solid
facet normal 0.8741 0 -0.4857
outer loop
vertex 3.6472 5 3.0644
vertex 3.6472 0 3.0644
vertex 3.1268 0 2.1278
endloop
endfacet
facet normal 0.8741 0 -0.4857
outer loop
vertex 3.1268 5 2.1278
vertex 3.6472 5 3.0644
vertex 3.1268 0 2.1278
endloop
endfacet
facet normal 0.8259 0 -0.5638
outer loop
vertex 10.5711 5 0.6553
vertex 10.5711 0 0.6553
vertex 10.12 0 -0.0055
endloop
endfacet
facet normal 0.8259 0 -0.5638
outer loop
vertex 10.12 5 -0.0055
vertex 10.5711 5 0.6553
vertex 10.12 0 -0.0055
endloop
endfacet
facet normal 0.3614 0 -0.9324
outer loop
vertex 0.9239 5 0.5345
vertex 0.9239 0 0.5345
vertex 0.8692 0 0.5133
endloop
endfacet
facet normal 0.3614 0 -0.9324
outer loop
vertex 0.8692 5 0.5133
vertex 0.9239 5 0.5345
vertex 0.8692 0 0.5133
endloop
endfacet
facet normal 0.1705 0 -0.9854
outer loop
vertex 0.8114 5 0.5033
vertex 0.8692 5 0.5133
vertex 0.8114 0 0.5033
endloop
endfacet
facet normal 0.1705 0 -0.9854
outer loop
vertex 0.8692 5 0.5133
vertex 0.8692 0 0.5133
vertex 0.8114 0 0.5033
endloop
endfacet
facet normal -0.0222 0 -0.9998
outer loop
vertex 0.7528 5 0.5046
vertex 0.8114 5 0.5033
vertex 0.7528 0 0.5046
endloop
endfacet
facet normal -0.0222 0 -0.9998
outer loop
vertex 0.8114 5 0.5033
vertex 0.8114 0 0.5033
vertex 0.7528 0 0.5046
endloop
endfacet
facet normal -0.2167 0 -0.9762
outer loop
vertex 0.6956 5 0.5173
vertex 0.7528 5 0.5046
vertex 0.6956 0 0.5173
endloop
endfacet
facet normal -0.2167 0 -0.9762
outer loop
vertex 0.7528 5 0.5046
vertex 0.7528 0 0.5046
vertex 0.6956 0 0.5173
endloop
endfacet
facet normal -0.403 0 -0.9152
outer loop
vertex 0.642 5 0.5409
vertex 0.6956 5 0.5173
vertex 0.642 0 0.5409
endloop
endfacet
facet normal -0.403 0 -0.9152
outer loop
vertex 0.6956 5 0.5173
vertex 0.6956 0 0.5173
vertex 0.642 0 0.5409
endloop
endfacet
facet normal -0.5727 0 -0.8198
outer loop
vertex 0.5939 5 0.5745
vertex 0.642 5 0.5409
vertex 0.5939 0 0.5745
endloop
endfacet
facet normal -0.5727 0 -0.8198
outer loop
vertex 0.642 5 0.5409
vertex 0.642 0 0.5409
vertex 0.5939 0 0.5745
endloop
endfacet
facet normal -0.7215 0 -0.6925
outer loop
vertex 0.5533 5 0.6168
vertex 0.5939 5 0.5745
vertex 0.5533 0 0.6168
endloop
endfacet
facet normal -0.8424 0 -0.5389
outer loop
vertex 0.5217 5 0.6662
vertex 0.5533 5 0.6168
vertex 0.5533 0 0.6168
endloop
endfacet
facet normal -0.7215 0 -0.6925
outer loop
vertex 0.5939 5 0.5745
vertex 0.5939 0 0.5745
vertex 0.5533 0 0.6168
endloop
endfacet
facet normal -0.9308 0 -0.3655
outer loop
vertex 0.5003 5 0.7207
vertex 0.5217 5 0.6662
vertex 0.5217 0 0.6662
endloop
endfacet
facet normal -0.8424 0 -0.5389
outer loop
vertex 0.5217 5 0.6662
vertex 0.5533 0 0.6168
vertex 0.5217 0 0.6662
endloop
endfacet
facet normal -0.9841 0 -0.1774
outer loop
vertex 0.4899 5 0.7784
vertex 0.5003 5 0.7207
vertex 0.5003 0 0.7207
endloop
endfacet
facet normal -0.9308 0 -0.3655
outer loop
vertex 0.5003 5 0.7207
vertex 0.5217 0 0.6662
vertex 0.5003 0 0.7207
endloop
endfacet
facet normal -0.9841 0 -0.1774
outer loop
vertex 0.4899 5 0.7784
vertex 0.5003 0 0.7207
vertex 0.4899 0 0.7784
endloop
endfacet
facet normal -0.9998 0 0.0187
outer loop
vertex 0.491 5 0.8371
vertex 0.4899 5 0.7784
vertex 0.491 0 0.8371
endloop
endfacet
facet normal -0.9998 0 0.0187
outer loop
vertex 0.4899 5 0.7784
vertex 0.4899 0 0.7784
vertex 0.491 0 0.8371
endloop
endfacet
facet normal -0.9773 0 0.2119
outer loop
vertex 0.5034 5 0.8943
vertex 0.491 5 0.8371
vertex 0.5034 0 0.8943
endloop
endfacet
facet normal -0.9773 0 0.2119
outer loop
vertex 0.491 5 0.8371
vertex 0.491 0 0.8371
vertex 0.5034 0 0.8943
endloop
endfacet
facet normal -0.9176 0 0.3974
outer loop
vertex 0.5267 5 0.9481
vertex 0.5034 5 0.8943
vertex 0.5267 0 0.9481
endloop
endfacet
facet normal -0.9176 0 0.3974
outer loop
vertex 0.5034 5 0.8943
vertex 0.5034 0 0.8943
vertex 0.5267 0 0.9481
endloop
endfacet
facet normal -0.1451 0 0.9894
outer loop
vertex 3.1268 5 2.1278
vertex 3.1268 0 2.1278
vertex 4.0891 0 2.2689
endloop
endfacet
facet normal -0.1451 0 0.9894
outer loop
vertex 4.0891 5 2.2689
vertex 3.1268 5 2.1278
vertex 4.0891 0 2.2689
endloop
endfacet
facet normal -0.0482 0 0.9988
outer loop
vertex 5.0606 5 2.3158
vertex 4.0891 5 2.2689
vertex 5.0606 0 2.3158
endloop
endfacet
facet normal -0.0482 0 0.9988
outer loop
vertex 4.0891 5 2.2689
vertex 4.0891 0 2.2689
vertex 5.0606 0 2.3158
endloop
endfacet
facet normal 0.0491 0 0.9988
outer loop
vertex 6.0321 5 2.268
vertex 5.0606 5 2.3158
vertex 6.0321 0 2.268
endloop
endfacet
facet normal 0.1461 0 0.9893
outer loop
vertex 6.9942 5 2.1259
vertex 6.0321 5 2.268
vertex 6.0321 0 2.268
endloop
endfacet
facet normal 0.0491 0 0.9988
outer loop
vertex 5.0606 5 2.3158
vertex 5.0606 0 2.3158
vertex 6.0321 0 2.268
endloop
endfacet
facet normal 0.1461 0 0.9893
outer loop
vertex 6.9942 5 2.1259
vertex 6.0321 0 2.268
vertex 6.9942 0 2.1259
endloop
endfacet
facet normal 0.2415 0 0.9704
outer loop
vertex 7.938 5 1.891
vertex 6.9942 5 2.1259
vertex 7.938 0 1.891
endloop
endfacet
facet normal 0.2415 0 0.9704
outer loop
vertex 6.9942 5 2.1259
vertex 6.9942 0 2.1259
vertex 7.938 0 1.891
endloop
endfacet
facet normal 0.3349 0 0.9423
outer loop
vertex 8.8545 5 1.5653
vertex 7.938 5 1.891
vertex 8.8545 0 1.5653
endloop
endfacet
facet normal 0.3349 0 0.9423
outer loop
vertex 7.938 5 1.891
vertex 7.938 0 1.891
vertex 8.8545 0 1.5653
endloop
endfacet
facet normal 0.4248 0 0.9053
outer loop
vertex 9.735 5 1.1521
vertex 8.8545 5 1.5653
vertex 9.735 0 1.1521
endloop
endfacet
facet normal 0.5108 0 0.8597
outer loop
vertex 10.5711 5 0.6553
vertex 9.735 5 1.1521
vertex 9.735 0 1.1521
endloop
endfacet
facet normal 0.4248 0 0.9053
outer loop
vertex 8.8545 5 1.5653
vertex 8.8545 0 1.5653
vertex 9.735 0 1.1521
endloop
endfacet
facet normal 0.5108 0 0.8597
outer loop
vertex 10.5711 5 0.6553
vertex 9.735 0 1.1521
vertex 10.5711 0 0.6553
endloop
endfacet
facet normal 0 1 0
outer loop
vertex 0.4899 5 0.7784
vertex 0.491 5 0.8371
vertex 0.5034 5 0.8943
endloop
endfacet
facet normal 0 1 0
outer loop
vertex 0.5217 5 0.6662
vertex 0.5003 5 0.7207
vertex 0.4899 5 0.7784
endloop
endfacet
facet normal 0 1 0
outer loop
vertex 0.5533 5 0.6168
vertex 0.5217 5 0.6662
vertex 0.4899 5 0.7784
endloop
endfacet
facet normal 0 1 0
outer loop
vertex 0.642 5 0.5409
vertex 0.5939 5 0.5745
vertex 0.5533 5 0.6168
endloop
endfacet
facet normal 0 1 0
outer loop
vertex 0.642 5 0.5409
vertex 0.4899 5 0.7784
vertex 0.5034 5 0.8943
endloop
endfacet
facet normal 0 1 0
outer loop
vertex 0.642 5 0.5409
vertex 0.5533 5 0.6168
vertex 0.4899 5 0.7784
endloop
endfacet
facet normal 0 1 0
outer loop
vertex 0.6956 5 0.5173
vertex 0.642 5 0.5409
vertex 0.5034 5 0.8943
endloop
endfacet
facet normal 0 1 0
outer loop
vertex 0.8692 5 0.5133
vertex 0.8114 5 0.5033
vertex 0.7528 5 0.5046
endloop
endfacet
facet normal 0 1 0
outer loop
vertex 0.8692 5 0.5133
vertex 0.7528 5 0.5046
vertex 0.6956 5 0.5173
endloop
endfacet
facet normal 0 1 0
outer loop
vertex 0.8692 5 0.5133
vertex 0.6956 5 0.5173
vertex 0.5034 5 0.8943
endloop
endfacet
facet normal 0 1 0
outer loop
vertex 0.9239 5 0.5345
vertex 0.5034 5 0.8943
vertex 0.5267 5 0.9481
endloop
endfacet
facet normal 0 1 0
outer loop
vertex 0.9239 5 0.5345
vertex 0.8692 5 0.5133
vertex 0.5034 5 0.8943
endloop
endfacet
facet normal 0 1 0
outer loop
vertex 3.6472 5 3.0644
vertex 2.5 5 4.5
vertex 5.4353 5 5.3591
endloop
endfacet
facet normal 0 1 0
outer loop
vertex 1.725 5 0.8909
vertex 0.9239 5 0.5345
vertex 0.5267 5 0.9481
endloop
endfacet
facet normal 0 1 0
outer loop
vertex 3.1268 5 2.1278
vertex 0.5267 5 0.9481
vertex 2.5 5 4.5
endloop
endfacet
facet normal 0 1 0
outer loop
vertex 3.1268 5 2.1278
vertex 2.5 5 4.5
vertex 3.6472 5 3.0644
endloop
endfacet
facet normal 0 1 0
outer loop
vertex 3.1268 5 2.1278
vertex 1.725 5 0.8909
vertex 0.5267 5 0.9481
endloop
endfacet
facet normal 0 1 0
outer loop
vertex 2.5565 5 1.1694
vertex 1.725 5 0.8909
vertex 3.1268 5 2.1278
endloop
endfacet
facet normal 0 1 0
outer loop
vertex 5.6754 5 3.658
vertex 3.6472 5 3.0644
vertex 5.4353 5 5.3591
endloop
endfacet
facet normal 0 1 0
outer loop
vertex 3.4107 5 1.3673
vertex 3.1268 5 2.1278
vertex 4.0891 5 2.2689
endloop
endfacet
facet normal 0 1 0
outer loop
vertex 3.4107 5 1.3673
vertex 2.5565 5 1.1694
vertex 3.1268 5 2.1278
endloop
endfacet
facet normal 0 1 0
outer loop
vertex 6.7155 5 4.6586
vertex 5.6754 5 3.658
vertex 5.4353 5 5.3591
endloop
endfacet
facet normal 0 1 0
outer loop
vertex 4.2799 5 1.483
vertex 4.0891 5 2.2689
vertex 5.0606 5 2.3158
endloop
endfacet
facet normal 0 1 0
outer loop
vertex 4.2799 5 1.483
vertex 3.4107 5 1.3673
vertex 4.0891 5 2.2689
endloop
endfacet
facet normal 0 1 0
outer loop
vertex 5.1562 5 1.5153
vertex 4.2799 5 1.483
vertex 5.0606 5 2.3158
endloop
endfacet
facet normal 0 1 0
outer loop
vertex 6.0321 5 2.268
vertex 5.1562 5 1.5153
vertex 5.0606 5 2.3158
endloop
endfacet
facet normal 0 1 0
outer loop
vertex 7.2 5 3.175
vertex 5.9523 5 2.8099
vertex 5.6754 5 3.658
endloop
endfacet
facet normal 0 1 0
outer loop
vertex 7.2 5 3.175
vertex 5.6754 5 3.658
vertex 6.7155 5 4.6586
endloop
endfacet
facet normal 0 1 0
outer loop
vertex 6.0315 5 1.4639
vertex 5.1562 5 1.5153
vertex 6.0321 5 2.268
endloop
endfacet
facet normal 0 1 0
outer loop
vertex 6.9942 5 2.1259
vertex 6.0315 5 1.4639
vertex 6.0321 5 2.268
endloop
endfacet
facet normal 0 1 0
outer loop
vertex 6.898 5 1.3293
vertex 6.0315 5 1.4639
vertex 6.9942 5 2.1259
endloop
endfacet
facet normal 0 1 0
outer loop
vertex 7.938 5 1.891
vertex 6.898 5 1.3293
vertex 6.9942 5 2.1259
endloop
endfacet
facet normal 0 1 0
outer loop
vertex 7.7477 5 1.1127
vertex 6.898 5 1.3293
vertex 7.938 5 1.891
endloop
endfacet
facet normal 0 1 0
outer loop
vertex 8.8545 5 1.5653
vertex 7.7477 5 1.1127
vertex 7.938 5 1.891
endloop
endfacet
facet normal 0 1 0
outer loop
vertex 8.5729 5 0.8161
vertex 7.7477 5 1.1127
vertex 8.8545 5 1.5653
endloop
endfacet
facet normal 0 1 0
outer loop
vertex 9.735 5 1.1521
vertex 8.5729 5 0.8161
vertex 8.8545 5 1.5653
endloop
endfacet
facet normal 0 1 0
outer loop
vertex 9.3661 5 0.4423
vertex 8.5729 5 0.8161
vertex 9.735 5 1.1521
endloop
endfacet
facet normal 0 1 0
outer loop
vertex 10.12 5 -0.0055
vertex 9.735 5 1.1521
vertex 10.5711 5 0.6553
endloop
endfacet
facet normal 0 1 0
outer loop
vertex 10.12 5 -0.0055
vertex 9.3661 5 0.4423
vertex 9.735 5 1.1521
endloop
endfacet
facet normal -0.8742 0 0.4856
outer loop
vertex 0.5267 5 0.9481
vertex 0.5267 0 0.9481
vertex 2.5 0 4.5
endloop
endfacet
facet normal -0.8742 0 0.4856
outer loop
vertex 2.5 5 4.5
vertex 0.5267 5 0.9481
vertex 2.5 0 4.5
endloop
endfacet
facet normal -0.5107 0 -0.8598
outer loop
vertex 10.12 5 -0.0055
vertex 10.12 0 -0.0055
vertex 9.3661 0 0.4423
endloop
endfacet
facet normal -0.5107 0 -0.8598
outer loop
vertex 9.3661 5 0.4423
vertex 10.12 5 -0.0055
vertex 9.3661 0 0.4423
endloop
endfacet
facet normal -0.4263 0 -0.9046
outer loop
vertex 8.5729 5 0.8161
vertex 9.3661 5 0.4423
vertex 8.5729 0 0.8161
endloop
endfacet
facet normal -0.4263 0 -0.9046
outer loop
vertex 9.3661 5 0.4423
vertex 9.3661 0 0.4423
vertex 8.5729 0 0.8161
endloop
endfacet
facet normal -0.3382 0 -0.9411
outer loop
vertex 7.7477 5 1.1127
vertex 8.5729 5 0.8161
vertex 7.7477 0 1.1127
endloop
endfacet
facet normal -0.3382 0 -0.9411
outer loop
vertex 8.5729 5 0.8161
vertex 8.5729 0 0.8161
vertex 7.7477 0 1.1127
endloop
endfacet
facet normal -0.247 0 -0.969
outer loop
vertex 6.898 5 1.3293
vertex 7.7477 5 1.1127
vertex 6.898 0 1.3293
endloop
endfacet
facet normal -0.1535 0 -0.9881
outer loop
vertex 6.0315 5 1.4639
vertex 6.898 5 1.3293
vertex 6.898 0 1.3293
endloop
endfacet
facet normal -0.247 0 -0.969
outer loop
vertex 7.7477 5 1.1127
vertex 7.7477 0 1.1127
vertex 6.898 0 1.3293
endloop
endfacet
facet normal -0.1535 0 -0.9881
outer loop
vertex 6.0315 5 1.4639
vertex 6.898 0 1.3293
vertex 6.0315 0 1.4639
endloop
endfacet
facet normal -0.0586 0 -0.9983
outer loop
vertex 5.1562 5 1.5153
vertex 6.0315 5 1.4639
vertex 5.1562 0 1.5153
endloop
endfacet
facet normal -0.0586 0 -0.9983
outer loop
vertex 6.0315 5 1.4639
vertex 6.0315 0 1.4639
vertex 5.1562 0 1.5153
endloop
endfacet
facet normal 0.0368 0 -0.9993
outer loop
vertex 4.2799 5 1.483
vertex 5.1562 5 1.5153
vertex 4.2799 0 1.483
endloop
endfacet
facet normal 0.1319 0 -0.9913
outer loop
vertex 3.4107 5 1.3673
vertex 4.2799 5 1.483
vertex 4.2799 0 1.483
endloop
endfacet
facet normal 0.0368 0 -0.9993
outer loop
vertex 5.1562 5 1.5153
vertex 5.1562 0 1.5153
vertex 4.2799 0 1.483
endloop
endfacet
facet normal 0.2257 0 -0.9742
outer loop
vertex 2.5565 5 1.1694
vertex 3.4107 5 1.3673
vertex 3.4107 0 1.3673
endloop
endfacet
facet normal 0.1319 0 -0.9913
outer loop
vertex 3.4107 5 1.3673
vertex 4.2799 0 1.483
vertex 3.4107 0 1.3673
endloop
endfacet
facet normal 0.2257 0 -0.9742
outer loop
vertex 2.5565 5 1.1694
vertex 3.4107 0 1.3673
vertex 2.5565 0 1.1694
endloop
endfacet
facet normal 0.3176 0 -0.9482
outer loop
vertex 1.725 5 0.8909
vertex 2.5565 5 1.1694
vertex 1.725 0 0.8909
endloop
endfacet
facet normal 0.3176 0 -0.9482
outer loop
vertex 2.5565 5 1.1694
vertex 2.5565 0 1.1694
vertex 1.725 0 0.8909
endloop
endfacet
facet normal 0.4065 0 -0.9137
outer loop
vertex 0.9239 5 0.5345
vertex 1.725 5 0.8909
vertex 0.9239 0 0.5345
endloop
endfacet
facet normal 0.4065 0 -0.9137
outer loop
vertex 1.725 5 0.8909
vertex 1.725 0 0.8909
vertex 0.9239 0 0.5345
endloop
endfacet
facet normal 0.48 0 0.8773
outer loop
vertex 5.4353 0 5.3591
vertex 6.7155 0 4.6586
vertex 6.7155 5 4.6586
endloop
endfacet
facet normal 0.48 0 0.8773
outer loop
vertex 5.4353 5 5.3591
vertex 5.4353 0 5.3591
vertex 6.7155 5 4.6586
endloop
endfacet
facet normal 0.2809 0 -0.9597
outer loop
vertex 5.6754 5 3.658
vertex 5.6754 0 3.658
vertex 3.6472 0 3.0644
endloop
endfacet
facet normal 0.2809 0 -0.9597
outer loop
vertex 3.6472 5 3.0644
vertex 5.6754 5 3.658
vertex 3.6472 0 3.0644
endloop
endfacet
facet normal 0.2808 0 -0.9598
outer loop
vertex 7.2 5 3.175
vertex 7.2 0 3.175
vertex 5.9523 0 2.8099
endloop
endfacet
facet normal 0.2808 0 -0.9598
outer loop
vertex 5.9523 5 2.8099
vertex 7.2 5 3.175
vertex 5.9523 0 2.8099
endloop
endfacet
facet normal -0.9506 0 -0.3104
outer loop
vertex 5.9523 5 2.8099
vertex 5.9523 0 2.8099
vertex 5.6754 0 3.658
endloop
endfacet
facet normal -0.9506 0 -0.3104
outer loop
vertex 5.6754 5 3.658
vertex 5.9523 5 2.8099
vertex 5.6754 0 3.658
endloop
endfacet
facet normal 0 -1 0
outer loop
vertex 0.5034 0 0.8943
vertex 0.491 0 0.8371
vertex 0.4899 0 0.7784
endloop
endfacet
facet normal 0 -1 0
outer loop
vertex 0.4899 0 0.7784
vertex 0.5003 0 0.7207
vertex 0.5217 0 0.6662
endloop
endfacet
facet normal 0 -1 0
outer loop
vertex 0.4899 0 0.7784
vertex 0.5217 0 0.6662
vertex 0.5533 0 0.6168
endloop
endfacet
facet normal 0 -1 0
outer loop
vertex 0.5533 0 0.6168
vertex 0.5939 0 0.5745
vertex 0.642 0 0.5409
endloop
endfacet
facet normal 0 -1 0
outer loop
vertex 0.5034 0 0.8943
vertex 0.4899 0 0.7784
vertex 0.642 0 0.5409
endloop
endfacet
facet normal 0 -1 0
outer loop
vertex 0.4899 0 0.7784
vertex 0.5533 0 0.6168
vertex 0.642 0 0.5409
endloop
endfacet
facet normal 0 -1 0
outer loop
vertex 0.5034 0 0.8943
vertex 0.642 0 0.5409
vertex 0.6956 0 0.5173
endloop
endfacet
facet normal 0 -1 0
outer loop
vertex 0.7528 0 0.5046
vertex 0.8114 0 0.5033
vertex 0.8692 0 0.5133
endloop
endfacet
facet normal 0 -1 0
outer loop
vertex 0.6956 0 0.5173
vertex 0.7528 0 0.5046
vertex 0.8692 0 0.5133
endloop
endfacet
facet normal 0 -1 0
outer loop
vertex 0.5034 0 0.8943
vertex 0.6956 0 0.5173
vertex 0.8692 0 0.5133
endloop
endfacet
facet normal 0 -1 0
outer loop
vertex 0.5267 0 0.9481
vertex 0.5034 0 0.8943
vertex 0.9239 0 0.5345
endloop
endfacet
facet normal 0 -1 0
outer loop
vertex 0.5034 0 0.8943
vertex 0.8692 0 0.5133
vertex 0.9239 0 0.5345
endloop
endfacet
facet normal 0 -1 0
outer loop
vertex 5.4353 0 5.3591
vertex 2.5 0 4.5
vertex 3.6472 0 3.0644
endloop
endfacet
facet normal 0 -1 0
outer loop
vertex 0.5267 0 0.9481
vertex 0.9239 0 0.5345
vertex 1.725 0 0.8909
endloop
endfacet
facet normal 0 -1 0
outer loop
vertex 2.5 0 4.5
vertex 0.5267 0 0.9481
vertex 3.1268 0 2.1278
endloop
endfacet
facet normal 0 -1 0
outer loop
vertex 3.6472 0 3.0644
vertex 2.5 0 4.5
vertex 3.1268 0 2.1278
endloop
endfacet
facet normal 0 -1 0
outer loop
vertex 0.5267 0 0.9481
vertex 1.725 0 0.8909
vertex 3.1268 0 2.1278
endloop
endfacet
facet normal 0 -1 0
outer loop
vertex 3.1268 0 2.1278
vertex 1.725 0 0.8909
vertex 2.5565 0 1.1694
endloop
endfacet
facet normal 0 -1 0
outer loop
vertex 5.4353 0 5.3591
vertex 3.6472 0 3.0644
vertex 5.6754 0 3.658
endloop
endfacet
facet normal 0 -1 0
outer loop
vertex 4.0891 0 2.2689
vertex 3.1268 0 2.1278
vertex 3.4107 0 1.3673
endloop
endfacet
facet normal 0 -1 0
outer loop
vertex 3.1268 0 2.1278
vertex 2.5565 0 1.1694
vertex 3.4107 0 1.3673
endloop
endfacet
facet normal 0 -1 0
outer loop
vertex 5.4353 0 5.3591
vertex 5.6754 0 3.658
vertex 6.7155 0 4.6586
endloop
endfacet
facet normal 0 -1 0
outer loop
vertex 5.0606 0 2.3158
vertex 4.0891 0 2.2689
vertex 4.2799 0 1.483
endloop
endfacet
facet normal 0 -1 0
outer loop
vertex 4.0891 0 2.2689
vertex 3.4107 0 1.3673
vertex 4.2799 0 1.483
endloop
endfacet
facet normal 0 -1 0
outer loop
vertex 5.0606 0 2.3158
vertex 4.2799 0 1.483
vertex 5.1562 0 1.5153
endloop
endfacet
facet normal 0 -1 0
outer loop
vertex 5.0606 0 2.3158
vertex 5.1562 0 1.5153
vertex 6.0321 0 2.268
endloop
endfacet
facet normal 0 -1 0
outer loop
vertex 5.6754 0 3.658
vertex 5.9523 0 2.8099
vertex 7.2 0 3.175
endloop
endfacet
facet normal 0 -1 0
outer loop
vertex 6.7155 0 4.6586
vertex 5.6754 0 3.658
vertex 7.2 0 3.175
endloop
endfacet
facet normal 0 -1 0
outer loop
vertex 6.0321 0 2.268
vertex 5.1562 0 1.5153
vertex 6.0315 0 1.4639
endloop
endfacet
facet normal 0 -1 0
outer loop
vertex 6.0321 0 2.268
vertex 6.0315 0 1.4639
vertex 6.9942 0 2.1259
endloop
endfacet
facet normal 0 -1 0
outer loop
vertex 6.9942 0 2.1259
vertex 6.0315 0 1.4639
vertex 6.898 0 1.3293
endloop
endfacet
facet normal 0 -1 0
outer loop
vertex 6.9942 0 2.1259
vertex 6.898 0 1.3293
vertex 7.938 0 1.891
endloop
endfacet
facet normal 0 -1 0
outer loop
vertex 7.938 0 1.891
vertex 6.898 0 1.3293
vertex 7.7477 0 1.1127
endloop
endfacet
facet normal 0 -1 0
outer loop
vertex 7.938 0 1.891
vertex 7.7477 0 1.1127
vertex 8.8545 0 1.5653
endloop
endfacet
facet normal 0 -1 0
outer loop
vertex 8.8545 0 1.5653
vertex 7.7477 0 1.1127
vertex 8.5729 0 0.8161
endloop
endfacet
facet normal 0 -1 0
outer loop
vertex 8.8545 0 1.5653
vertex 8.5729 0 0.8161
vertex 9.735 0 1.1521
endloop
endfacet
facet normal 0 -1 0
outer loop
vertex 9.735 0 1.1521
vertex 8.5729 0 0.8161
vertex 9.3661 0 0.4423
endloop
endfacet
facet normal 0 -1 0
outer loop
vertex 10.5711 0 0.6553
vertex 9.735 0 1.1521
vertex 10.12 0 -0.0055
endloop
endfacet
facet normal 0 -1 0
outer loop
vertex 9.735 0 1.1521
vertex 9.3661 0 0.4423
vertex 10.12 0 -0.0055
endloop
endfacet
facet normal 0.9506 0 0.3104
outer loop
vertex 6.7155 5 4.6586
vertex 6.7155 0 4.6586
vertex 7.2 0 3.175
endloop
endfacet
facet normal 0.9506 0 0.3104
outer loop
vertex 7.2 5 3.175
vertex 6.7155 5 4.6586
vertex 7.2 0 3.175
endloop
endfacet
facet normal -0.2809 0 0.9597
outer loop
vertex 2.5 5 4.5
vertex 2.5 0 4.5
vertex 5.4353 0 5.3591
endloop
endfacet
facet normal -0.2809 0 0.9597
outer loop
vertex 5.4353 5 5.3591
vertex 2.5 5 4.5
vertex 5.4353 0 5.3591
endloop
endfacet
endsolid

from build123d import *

# Parameters (mm, degrees)
EXTRUDE_1_DEPTH = 5
CHAMFER_1_SIZE  = 1
CHAMFER_1_SIZE2 = 1.032395136


with BuildPart() as part:
    # Эскиз1 → Бобышка-Вытянуть1 (new body)
    with BuildSketch(Plane(origin=(0, 0, 0), x_dir=(1, 0, 0), z_dir=(0, 1, 0))):
        with BuildLine():
            Line((2.5, -4.5), (6.395063253, -5.64))
            Line((6.395063253, -5.64), (7.2, -3.175018115))
            Line((7.2, -3.175018115), (5.952339772, -2.809855198))
            Line((5.952339772, -2.809855198), (5.675364666, -3.658044352))
            Line((5.675364666, -3.658044352), (3.647199382, -3.06444464))
            Line((3.647199382, -3.06444464), (3.126833621, -2.12778627))
            ThreePointArc((3.126833621, -2.12778627), (6.994242164, -2.125926125), (10.57111662, -0.655272725))
            Line((10.57111662, -0.655272725), (10.119998501, 0.005508219))
            ThreePointArc((10.119998501, 0.005508219), (5.594481852, -1.5), (0.923871938, -0.534464416))
            ThreePointArc((0.923871938, -0.534464416), (0.572572084, -0.594660683), (0.526733755, -0.948120759))
            Line((0.526733755, -0.948120759), (2.5, -4.5))
        make_face()
    extrude(amount=EXTRUDE_1_DEPTH)

    # Фаска1
    chamfer_1_edges = [part.edges().sort_by_distance(p)[0] for p in [
        (6.395063253, 2.5, 5.64),
    ]]
    chamfer_1_side = [part.faces().sort_by_distance(p)[0] for p in [
        (4.447531626, 2.5, 5.07),
    ]]
    chamfer(chamfer_1_edges, length=CHAMFER_1_SIZE, length2=CHAMFER_1_SIZE2, reference=chamfer_1_side[0])


solid = part.part
